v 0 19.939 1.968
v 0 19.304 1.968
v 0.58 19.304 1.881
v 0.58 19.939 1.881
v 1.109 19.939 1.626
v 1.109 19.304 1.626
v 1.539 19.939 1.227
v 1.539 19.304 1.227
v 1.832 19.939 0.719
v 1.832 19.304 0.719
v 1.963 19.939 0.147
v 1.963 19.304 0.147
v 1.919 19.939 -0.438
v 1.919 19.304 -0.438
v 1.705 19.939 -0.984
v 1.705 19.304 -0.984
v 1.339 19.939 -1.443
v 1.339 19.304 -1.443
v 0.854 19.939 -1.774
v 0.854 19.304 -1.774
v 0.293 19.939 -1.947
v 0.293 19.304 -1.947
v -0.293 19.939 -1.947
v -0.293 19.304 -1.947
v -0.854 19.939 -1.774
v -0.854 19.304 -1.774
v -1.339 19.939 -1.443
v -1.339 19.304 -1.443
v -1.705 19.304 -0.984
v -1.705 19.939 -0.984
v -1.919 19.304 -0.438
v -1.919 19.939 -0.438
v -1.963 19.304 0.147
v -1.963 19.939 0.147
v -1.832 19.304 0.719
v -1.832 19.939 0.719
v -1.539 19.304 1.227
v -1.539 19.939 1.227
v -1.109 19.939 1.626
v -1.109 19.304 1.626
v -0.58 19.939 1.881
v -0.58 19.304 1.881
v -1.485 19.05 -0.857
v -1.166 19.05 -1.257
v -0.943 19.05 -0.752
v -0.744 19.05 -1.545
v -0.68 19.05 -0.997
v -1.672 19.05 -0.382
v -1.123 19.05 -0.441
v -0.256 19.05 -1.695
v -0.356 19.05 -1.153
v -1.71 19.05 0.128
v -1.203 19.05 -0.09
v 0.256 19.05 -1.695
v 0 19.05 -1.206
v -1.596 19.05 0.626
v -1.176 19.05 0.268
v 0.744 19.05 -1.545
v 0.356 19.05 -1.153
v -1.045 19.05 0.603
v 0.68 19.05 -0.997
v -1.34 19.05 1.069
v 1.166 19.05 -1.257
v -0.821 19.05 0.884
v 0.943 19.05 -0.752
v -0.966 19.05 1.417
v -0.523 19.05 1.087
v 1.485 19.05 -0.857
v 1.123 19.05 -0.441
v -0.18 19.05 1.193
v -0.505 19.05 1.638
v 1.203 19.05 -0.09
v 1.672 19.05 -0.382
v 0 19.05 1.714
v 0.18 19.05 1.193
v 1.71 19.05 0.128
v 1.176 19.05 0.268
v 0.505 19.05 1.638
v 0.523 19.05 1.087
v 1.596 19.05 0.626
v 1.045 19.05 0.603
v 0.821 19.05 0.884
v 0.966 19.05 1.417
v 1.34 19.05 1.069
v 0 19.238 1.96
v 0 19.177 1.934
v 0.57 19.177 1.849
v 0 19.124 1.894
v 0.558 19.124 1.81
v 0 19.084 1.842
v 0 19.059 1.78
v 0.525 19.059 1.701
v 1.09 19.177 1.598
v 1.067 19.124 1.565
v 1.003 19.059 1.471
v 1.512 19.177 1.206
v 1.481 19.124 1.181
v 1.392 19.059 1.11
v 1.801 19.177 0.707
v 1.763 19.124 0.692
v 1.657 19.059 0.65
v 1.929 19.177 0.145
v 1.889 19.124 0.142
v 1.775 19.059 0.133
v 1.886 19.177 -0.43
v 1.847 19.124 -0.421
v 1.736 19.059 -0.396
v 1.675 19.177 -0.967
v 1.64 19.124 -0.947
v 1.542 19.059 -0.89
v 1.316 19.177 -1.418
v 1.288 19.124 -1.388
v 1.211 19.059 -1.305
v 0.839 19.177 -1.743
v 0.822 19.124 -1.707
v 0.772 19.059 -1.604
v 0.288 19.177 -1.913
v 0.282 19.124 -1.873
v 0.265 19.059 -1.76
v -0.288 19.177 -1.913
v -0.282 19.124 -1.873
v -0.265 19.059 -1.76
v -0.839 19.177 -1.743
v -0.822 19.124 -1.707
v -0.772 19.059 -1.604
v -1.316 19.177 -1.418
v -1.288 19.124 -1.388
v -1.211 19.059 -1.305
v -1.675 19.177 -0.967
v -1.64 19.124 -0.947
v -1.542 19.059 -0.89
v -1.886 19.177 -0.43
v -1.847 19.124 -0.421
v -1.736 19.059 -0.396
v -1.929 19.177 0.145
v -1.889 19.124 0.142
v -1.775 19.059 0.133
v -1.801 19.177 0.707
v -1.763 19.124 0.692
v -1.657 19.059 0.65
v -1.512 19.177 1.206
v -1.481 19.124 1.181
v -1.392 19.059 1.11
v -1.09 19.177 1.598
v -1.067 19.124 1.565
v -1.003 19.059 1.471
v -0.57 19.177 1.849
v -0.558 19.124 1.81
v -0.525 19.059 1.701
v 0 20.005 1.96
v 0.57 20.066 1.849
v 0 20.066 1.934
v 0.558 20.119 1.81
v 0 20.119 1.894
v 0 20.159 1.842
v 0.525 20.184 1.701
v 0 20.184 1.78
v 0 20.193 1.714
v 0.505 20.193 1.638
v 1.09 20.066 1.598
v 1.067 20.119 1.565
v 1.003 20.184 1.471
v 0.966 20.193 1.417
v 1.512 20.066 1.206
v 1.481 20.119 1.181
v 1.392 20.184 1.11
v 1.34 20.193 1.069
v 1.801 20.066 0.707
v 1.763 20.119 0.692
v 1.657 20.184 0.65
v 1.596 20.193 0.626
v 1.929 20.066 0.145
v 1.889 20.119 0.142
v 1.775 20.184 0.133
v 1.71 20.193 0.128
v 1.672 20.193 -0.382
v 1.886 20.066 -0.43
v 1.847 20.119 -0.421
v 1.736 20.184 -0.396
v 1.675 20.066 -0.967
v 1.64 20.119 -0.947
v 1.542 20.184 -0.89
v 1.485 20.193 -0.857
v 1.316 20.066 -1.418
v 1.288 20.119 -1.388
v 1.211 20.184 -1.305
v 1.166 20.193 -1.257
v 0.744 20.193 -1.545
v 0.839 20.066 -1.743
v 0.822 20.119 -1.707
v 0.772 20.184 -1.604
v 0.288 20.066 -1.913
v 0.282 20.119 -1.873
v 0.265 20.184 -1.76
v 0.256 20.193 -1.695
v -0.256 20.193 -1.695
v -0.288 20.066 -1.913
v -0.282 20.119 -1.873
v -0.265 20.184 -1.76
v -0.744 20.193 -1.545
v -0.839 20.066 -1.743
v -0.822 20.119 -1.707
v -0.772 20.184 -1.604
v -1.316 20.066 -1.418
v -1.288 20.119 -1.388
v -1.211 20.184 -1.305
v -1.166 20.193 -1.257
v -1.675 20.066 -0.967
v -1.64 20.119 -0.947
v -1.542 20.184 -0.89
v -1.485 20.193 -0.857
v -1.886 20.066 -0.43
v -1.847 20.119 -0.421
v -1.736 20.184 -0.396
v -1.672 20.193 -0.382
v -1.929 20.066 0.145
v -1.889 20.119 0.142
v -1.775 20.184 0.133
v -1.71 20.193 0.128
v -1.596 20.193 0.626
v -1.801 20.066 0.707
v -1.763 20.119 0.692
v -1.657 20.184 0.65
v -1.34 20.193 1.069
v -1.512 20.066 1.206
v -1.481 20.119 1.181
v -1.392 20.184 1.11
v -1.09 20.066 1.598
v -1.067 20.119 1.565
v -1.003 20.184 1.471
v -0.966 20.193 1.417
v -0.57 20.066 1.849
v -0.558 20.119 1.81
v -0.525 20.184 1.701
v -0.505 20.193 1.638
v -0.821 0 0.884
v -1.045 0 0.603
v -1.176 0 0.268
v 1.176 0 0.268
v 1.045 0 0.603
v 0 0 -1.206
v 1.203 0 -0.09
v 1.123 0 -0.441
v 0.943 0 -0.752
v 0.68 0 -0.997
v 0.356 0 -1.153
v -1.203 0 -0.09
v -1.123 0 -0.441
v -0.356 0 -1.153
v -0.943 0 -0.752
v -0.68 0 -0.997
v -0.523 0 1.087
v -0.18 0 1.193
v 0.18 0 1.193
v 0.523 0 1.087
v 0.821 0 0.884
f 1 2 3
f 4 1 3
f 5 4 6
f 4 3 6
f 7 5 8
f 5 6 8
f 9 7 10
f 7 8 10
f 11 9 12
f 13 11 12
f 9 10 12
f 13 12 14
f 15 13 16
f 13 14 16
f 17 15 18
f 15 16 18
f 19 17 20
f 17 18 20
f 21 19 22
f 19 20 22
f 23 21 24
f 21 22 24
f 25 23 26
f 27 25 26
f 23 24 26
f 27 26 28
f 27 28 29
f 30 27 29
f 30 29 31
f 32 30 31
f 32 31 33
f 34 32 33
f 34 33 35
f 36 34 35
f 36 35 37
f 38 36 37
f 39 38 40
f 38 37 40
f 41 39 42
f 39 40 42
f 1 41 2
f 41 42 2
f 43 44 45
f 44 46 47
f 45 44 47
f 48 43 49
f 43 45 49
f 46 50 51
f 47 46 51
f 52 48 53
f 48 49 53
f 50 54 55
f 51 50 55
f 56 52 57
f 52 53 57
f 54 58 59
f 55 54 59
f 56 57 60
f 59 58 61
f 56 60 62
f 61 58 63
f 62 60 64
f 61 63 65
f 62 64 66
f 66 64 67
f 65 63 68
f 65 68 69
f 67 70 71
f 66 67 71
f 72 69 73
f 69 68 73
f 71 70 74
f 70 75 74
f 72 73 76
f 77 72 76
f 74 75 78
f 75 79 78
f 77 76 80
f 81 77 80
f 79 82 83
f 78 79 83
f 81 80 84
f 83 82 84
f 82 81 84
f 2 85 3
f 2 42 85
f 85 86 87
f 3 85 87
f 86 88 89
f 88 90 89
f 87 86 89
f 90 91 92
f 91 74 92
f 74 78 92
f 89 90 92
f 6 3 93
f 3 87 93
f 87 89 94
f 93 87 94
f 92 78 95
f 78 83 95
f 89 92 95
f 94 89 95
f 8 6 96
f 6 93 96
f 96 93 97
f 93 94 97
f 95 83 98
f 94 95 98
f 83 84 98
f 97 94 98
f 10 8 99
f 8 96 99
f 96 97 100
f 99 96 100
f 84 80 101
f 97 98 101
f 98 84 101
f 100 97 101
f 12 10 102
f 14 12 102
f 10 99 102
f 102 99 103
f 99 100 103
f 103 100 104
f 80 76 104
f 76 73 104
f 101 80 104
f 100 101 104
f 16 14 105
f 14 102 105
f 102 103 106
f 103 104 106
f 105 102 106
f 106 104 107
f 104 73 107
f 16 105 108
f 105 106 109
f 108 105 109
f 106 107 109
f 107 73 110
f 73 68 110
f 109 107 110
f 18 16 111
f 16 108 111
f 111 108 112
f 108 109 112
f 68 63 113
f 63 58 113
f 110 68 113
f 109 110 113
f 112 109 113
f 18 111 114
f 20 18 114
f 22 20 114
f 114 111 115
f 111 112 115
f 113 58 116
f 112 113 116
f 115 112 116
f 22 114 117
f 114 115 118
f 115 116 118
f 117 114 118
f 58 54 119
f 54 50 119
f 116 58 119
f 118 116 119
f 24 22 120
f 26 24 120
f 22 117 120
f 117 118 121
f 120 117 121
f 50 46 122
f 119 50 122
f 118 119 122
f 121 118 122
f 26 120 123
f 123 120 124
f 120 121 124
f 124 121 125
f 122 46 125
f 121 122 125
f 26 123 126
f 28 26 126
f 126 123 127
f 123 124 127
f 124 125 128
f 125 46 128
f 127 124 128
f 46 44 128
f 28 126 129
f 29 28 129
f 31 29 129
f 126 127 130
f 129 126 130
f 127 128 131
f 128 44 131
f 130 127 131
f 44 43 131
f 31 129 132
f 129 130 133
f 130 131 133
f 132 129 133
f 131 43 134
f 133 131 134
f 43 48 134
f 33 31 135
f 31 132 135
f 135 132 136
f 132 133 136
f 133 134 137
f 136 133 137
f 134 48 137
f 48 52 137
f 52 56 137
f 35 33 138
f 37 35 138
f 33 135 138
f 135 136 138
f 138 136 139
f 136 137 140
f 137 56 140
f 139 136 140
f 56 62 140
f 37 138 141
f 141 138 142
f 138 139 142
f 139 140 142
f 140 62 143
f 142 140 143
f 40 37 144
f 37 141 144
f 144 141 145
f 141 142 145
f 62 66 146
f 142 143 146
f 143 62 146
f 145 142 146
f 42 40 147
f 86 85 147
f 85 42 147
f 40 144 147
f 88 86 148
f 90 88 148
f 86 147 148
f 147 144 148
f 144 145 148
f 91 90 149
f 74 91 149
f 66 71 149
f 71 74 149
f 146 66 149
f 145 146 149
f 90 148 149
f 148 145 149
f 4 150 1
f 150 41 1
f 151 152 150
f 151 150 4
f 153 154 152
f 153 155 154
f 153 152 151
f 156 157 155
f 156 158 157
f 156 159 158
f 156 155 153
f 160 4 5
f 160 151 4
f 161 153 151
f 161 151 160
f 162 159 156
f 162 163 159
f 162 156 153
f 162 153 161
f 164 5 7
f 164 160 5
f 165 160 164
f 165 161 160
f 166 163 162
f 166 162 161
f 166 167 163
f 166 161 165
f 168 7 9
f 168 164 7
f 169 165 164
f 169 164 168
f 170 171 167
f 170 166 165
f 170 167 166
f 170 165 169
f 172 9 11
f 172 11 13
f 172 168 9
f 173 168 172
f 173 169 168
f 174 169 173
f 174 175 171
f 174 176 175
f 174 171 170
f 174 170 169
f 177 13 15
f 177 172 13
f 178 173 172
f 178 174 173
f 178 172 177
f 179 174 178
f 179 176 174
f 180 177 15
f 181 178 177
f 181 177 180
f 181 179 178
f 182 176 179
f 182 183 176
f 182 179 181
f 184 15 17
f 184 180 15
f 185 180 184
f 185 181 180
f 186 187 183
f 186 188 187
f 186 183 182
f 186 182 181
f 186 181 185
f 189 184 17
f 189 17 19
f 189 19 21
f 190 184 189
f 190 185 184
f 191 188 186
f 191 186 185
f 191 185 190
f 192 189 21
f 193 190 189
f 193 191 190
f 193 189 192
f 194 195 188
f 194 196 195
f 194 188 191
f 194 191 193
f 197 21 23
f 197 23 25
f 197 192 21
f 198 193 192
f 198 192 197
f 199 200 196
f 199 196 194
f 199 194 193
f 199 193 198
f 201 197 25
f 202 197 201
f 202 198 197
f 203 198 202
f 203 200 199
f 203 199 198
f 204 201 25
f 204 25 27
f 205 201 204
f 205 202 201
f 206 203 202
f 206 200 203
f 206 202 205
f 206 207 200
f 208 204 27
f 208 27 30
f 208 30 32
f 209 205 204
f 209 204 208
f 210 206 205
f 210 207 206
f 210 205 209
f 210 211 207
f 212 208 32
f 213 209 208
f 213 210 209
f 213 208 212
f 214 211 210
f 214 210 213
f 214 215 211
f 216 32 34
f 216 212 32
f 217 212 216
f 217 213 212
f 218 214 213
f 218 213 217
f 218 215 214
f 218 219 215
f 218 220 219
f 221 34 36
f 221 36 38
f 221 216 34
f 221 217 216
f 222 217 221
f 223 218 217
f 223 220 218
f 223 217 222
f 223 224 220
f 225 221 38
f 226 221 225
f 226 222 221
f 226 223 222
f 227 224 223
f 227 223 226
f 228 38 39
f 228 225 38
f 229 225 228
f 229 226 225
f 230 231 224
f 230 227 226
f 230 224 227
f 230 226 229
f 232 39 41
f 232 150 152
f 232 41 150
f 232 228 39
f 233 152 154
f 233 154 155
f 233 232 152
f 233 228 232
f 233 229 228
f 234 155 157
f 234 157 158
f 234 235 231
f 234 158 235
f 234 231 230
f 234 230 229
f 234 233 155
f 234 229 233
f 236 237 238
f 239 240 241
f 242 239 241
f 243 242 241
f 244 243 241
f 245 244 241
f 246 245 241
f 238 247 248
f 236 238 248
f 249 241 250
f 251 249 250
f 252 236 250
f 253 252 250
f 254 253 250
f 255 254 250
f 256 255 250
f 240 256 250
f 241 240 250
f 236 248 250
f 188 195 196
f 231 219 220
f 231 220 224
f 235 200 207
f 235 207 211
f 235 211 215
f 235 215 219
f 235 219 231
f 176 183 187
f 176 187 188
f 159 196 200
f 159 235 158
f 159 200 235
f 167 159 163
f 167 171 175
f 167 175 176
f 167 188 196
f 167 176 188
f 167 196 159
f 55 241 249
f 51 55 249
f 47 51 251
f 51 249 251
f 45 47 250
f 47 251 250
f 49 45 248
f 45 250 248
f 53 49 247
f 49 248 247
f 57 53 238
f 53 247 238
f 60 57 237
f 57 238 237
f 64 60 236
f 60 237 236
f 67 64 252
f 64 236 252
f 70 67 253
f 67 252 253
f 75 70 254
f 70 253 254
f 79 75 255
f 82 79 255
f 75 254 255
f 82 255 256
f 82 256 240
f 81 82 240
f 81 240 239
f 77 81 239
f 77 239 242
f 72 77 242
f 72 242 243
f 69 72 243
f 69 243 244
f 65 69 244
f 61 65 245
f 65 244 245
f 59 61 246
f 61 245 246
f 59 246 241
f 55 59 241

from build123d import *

# Parameters (mm, degrees)
SKETCH1_R           = 1.2065
BOSS_EXTRUDE1_DEPTH = 19.05
SKETCH2_R           = 1.9685
BOSS_EXTRUDE2_DEPTH = 1.143
FILLET1_R           = 0.254


with BuildPart() as part:
    # Sketch1 → Boss-Extrude1 (new body)
    with BuildSketch(Plane(origin=(0, 0, 0), x_dir=(1, 0, 0), z_dir=(0, 1, 0))):
        with Locations(Location((0, 0, 0), (0, 0, 90))):
            Circle(SKETCH1_R)
    extrude(amount=BOSS_EXTRUDE1_DEPTH)

    # Sketch2 → Boss-Extrude2 (add)
    with BuildSketch(Plane(origin=(0, 19.05, 0), x_dir=(1, 0, 0), z_dir=(0, 1, 0))):
        with Locations(Location((0, 0, 0), (0, 0, 270))):
            Circle(SKETCH2_R)
    extrude(amount=BOSS_EXTRUDE2_DEPTH)

    # Fillet1
    fillet1_edges = [part.edges().sort_by_distance(p)[0] for p in [
        (0, 19.05, -1.9685),
        (0, 20.193, -1.9685),
    ]]
    fillet(fillet1_edges, radius=FILLET1_R)


solid = part.part
